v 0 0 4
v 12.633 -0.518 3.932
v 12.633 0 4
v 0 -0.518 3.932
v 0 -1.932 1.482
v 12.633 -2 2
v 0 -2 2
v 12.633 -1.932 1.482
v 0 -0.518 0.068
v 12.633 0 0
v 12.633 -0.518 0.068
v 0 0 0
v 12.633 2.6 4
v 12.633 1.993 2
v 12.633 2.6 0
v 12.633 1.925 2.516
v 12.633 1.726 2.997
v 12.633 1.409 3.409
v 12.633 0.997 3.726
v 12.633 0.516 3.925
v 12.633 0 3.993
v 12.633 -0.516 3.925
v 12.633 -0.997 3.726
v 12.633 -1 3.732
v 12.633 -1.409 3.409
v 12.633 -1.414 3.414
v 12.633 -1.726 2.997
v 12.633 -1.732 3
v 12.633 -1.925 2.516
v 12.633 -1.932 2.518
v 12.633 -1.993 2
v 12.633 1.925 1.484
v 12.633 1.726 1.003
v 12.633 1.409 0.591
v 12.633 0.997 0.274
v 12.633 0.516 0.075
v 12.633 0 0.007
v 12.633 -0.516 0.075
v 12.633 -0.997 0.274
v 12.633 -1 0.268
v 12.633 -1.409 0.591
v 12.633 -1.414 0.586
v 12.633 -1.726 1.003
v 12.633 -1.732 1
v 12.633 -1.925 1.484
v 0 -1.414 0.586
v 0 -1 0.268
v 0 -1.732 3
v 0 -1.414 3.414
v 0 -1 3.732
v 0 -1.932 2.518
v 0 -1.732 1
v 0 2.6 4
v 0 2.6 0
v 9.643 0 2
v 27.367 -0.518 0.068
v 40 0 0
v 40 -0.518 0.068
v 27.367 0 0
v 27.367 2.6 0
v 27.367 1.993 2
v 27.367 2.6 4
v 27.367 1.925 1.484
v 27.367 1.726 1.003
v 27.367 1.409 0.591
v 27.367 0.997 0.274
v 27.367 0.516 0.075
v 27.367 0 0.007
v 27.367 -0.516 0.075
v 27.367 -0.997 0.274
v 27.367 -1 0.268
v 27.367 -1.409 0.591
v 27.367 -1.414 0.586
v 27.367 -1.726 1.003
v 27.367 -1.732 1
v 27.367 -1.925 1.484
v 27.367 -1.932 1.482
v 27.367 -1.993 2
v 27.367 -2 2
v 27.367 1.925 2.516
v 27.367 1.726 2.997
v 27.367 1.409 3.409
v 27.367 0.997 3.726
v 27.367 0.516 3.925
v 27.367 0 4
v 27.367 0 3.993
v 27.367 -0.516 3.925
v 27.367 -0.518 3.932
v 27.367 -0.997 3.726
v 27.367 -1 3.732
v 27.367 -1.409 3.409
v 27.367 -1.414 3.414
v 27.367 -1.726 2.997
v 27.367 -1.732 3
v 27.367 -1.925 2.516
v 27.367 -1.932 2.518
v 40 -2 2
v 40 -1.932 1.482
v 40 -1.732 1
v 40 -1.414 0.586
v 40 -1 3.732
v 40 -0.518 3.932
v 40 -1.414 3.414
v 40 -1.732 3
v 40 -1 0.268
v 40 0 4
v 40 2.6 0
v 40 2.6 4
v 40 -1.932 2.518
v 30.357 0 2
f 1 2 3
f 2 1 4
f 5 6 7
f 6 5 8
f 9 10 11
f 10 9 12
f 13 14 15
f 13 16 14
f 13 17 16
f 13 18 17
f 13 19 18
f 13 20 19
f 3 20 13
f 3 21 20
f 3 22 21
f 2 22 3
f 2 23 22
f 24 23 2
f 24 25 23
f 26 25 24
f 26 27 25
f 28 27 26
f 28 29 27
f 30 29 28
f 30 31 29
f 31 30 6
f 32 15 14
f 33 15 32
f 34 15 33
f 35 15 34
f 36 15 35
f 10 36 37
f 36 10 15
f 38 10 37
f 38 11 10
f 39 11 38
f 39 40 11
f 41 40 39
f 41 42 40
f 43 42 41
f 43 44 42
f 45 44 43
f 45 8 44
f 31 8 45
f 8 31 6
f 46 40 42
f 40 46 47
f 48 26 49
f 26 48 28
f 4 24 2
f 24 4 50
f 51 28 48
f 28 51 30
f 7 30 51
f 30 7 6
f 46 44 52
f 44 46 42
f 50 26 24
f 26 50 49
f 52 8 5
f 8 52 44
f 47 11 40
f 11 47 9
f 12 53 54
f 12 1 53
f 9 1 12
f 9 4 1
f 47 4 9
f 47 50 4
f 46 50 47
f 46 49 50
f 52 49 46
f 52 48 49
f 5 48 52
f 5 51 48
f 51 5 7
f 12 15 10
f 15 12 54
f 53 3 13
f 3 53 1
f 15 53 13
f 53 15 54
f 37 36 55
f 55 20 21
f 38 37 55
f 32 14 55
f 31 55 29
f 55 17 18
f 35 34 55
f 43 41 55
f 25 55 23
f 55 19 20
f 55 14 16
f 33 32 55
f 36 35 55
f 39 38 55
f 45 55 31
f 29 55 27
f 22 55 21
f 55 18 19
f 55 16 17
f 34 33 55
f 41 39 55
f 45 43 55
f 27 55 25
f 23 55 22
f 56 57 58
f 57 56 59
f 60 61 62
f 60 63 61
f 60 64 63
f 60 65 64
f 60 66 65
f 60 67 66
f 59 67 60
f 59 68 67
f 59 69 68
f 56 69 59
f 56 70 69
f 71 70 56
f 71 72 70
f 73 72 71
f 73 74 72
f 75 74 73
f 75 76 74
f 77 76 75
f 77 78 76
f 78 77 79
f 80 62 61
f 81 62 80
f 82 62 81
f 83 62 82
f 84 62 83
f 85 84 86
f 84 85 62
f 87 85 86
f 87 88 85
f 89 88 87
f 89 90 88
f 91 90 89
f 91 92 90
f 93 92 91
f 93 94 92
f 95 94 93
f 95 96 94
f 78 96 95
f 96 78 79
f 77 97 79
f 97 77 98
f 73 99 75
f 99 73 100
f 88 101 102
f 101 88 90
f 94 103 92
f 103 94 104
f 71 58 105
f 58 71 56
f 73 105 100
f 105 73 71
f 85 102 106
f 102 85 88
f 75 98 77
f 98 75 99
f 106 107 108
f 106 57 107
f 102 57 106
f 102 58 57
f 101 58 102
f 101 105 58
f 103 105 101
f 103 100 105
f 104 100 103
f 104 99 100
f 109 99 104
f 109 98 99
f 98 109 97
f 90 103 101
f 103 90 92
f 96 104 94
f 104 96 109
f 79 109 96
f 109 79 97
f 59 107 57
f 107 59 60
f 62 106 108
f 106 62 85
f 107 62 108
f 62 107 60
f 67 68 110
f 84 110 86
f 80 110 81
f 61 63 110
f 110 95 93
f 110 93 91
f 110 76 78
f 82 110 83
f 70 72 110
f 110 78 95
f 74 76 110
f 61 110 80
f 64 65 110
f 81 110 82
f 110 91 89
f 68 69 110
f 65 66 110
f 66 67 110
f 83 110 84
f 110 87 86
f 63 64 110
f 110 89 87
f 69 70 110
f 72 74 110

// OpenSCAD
// mathgrrl cone hinge

//////////////////////////////////////////////////////
// parameters

// Length of the complete hinge
length = 40;

// Height (diameter) of the hinge
height = 4;

// Clearance between cones and holes
clearance = .7;		

// Clearance between hinge and sides
gap = .6; 				

// Parameters that the user does not get to specify
$fn=24*1;
border = 2*1; 
fudge = .01*1;			// to preserve mesh integrity
corner = 0*1;      	// space between hinge and corner
hinge_radius = height/2;
cone_height = 1.5*hinge_radius;  

//////////////////////////////////////////////////////
// renders

rotate(90,[0,1,0]) 
	translate([-hinge_radius,0,0])
		hinge();

//translate([0,hinge_radius+gap,0]) bar();
//translate([0,-2*border-hinge_radius-gap,0]) bar();

//translate([0,hinge_radius+gap,0]) square();
//translate([0,-length-hinge_radius-gap,0]) square();


//////////////////////////////////////////////////////
// module for hinge

module hinge(){
	rad = hinge_radius;
	clr = clearance;
	len = (length-2*corner)/3; 
	con = cone_height;
	// left outside hinge = (cylinder+box)-cone
	difference(){
		union(){
			translate([0,0,corner]) cylinder(h=len-clr,r=rad);
			translate([-rad,0,corner]) cube([2*rad,rad+gap,len-clr]);
		}
		translate([0,0,corner+len-con-clr+fudge]) cylinder(h=con,r1=0,r2=rad);
	}
	// inside hinge = cylinder+box+cone+cone
	/*union(){
		translate([0,0,corner+len]) cylinder(h=len,r=rad);
		translate([-rad,-rad-gap,corner+len]) cube([2*rad,rad+gap,len]);
		translate([0,0,corner+len-con]) cylinder(h=con,r1=0,r2=rad);
		translate([0,0,corner+2*len]) cylinder(h=con,r1=rad,r2=0);
	}*/
	// right outside hinge = (cylinder+box)-cone
	difference(){
		union(){
			translate([0,0,corner+2*len+clr]) cylinder(h=len-clr,r=rad);
			translate([-rad,0,corner+2*len+clr]) cube([2*rad,rad+gap,len-clr]);
		}
		translate([0,0,corner+2*len+clr-fudge]) cylinder(h=con,r1=rad,r2=0);	
	}
}

//////////////////////////////////////////////////////
// module for square shape

module square(){
	difference(){
		cube([length,length,height]);
		translate([border,border,-fudge])
			cube(	[length-2*border,length-2*border,height+2*fudge]);
	}
}

//////////////////////////////////////////////////////
// module for bar shape

module bar(){
	cube([length,2*border,height]);
}
